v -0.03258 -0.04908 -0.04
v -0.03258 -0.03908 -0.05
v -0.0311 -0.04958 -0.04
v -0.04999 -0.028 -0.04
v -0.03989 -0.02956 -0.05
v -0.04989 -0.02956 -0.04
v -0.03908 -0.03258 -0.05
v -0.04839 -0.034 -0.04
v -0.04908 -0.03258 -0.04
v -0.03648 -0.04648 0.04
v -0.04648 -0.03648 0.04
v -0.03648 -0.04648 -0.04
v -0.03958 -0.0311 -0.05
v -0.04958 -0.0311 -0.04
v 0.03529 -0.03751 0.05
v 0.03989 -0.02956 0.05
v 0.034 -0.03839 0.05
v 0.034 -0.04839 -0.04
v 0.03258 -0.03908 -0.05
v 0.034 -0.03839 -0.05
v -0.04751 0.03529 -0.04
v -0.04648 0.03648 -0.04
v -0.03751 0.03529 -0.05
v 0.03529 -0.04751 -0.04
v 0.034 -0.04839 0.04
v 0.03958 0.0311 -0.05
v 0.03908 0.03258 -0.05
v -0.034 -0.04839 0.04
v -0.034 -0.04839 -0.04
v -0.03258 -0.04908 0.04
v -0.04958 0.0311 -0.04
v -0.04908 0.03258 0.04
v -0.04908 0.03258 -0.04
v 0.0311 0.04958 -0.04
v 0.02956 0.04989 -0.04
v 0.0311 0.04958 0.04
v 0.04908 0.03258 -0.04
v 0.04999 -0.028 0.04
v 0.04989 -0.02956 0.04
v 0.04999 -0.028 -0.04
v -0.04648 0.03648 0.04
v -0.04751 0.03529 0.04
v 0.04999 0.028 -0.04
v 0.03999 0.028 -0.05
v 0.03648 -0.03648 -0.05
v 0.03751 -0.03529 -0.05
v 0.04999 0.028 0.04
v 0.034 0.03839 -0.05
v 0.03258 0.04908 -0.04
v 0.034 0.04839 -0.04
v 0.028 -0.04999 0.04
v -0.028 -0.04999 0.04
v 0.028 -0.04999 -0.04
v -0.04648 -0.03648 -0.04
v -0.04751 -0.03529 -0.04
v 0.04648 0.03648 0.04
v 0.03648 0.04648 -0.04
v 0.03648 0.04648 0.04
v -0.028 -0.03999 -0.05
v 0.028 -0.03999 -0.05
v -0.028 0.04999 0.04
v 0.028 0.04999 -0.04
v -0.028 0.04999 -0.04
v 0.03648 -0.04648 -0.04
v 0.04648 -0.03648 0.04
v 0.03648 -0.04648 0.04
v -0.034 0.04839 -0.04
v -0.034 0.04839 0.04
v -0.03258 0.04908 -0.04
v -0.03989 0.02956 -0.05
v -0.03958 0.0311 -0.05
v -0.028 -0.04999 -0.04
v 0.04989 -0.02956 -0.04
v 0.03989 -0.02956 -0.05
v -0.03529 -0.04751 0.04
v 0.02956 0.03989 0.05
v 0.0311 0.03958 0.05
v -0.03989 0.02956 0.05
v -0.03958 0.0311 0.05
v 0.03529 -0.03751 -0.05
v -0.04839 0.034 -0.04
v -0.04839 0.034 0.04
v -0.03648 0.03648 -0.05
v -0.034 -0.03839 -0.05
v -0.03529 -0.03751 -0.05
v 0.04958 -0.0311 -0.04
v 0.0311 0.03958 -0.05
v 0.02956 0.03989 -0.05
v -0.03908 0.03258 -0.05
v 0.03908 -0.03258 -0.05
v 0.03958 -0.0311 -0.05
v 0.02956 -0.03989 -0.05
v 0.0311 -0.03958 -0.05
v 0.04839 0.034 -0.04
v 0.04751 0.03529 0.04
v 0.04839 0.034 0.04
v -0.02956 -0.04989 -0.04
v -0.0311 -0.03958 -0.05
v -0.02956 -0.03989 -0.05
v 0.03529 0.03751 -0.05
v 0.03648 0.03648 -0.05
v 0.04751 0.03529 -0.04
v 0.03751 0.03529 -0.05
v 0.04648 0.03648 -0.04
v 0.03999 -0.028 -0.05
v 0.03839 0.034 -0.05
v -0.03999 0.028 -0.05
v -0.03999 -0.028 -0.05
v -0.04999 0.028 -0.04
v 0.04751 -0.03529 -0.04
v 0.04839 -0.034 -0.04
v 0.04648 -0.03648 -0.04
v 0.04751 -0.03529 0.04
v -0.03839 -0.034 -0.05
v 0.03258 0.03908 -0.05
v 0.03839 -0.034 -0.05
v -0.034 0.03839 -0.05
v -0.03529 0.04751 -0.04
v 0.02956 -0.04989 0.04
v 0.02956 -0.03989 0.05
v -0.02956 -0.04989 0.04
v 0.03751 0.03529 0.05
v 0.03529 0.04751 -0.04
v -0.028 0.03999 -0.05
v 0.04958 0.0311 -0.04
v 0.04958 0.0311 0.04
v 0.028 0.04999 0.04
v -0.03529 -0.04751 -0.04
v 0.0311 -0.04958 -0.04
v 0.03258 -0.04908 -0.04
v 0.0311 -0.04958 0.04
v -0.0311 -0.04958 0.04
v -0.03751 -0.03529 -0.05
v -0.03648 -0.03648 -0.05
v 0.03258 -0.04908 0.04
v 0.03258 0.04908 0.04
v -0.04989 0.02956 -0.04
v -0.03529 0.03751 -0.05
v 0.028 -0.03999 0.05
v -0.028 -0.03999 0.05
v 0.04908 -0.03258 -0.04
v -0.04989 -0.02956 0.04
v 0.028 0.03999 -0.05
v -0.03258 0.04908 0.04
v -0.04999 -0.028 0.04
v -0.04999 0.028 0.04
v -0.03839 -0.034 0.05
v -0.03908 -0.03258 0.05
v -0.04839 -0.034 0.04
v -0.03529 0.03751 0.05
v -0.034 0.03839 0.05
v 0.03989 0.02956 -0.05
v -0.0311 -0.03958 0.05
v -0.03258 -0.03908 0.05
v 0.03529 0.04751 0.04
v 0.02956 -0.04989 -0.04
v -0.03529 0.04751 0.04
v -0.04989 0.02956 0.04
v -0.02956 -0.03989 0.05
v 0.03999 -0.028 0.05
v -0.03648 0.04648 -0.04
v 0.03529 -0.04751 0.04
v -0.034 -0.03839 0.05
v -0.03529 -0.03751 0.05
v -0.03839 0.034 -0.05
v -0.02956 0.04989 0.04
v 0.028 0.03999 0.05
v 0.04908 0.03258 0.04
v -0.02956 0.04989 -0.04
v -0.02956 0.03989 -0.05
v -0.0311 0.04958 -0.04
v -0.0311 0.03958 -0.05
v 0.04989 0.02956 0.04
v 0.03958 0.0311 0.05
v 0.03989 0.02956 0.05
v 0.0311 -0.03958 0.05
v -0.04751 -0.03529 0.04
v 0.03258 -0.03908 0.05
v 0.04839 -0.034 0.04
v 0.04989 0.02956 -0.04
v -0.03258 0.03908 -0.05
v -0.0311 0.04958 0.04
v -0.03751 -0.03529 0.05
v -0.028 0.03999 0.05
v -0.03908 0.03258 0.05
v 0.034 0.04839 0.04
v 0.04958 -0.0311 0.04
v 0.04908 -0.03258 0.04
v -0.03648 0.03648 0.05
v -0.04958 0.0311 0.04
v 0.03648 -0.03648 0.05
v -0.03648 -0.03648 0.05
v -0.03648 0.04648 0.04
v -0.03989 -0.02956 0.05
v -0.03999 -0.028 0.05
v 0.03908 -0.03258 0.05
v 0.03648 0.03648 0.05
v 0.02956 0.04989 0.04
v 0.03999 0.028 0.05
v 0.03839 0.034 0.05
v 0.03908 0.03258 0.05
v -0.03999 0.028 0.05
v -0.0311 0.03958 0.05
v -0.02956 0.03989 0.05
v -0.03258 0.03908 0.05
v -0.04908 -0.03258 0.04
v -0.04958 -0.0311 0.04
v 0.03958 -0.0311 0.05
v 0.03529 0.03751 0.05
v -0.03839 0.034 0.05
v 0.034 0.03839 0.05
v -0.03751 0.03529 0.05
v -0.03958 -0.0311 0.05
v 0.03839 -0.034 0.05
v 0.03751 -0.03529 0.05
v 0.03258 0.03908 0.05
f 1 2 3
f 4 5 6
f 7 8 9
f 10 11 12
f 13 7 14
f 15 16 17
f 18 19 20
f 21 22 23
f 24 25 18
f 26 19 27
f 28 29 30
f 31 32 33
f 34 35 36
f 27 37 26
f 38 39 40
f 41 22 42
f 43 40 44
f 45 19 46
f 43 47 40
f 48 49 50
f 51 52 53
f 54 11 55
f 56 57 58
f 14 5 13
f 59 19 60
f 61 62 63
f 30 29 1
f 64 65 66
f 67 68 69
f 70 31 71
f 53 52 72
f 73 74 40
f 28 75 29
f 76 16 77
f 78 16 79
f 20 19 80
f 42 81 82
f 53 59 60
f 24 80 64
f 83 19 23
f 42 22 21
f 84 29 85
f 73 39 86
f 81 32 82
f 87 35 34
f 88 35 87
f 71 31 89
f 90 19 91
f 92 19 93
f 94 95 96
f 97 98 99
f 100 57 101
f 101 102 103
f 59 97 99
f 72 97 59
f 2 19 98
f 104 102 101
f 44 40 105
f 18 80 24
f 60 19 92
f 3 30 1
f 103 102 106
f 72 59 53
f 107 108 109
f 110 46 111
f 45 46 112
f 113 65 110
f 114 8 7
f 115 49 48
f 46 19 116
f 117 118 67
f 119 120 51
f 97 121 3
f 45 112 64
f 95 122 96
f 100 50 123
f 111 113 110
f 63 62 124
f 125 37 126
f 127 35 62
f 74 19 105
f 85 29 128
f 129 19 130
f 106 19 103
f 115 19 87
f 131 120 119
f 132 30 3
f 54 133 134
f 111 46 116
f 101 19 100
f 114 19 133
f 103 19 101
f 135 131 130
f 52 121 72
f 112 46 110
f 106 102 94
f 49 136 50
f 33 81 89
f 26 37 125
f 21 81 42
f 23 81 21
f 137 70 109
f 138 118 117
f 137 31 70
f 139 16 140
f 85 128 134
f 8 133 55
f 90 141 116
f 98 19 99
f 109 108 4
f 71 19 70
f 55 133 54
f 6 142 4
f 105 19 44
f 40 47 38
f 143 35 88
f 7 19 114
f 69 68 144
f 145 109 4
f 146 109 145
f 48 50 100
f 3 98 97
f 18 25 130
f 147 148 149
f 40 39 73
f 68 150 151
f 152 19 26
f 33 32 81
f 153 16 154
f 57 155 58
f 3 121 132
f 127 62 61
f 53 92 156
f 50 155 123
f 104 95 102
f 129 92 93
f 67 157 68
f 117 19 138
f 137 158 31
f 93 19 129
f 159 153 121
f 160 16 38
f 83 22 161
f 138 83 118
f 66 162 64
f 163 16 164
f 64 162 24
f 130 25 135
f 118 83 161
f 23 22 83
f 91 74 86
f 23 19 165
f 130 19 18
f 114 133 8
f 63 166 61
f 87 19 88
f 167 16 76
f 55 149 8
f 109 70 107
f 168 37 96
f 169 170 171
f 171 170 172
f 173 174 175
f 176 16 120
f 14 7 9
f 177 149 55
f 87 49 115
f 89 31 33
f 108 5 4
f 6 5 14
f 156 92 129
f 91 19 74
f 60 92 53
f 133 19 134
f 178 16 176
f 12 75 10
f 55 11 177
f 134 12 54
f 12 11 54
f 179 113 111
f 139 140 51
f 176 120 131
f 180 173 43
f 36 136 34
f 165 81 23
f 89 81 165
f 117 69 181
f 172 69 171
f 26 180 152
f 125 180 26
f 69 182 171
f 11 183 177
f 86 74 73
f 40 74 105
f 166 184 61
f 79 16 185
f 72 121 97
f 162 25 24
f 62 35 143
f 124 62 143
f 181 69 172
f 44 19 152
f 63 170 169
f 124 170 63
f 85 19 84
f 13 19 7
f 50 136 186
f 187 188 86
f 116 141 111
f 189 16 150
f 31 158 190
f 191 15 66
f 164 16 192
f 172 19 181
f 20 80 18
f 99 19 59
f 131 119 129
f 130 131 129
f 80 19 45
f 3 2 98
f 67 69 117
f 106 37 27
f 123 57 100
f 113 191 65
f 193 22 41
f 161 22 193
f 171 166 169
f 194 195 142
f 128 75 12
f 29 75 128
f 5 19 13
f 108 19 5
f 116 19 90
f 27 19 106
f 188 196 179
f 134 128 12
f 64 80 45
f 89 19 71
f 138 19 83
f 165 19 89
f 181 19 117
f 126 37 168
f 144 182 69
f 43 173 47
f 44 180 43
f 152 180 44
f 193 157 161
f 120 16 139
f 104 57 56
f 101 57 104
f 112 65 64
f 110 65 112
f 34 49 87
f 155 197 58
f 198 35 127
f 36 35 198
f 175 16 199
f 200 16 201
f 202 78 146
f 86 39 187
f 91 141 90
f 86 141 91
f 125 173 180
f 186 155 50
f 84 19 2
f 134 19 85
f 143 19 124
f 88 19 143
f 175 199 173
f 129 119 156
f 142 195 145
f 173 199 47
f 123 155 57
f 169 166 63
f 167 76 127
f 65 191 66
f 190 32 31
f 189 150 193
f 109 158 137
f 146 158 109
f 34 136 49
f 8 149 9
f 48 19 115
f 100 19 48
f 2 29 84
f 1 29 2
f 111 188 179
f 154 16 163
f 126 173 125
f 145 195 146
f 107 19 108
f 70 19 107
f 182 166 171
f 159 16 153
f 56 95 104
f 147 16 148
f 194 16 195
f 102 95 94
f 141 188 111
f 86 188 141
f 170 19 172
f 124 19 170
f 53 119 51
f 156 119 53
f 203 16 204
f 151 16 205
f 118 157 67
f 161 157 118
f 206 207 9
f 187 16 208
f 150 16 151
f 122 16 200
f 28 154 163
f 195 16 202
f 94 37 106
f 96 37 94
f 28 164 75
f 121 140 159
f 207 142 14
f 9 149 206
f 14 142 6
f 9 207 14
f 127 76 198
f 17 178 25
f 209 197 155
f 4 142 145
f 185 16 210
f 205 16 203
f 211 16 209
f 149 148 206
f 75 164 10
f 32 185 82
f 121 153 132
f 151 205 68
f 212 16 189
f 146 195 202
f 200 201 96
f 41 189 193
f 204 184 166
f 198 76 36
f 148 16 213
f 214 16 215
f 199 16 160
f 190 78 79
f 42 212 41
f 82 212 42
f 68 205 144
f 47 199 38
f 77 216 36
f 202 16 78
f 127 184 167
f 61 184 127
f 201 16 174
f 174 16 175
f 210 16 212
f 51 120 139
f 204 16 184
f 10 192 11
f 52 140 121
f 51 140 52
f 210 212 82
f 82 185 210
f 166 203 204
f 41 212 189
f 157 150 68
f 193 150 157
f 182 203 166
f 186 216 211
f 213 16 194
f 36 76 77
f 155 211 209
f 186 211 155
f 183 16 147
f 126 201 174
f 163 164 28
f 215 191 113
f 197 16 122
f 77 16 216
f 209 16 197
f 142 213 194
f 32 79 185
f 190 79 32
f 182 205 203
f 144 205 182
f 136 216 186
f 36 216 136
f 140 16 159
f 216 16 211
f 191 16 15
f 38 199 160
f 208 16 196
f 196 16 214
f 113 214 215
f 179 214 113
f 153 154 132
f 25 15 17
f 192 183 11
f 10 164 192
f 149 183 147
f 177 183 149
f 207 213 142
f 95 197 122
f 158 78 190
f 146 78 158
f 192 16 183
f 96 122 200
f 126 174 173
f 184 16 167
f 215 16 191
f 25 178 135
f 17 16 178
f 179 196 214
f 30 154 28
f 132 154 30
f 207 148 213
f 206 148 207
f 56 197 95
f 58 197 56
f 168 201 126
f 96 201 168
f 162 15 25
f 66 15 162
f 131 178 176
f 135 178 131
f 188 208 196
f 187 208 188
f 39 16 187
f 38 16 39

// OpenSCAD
// Rounded-rectangle (square-like) solid block with uniform chamfer on all edges
// Bounding box: 0.1 x 0.1 x 0.1 mm

$fn = 48;

// Parameters (mm)
bbox_x = 0.1;
bbox_y = 0.1;
bbox_z = 0.1;

chamfer = 0.01;          // bevel distance along each face
corner_r = 0.012;        // XY corner rounding radius (rounded-rectangle outline)
eps = 0.0005;

// Clamp helpers
function clamp(v, lo, hi) = v < lo ? lo : (v > hi ? hi : v);

// Keep parameters valid
ch = clamp(chamfer, eps, min(bbox_x, bbox_y, bbox_z)/2 - eps);
cr = clamp(corner_r, eps, min(bbox_x, bbox_y)/2 - ch - eps);

// 2D rounded rectangle (centered)
module rrect2d(w, h, r) {
    r2 = clamp(r, 0, min(w, h)/2 - eps);
    hull() {
        for (sx = [-1, 1], sy = [-1, 1])
            translate([sx*(w/2 - r2), sy*(h/2 - r2)])
                circle(r=r2);
    }
}

// Main solid: rounded-rectangle prism, then chamfer all edges via Minkowski with octahedron
module chamfered_tile() {
    // Base prism with flat central faces (before chamfer)
    base_w = bbox_x - 2*ch;
    base_h = bbox_y - 2*ch;
    base_z = bbox_z - 2*ch;

    // Octahedron of "radius" ch creates planar 45° chamfers on all edges/corners
    module octa(r) {
        polyhedron(
            points=[
                [ r, 0, 0], [-r, 0, 0],
                [ 0, r, 0], [ 0,-r, 0],
                [ 0, 0, r], [ 0, 0,-r]
            ],
            faces=[
                [0,2,4],[2,1,4],[1,3,4],[3,0,4],
                [2,0,5],[1,2,5],[3,1,5],[0,3,5]
            ]
        );
    }

    minkowski() {
        // Rounded-rectangle outline in XY, uniform thickness in Z
        linear_extrude(height=base_z, center=true, convexity=10)
            rrect2d(base_w, base_h, cr);
        octa(ch);
    }
}

// Final output: one connected solid
chamfered_tile();
